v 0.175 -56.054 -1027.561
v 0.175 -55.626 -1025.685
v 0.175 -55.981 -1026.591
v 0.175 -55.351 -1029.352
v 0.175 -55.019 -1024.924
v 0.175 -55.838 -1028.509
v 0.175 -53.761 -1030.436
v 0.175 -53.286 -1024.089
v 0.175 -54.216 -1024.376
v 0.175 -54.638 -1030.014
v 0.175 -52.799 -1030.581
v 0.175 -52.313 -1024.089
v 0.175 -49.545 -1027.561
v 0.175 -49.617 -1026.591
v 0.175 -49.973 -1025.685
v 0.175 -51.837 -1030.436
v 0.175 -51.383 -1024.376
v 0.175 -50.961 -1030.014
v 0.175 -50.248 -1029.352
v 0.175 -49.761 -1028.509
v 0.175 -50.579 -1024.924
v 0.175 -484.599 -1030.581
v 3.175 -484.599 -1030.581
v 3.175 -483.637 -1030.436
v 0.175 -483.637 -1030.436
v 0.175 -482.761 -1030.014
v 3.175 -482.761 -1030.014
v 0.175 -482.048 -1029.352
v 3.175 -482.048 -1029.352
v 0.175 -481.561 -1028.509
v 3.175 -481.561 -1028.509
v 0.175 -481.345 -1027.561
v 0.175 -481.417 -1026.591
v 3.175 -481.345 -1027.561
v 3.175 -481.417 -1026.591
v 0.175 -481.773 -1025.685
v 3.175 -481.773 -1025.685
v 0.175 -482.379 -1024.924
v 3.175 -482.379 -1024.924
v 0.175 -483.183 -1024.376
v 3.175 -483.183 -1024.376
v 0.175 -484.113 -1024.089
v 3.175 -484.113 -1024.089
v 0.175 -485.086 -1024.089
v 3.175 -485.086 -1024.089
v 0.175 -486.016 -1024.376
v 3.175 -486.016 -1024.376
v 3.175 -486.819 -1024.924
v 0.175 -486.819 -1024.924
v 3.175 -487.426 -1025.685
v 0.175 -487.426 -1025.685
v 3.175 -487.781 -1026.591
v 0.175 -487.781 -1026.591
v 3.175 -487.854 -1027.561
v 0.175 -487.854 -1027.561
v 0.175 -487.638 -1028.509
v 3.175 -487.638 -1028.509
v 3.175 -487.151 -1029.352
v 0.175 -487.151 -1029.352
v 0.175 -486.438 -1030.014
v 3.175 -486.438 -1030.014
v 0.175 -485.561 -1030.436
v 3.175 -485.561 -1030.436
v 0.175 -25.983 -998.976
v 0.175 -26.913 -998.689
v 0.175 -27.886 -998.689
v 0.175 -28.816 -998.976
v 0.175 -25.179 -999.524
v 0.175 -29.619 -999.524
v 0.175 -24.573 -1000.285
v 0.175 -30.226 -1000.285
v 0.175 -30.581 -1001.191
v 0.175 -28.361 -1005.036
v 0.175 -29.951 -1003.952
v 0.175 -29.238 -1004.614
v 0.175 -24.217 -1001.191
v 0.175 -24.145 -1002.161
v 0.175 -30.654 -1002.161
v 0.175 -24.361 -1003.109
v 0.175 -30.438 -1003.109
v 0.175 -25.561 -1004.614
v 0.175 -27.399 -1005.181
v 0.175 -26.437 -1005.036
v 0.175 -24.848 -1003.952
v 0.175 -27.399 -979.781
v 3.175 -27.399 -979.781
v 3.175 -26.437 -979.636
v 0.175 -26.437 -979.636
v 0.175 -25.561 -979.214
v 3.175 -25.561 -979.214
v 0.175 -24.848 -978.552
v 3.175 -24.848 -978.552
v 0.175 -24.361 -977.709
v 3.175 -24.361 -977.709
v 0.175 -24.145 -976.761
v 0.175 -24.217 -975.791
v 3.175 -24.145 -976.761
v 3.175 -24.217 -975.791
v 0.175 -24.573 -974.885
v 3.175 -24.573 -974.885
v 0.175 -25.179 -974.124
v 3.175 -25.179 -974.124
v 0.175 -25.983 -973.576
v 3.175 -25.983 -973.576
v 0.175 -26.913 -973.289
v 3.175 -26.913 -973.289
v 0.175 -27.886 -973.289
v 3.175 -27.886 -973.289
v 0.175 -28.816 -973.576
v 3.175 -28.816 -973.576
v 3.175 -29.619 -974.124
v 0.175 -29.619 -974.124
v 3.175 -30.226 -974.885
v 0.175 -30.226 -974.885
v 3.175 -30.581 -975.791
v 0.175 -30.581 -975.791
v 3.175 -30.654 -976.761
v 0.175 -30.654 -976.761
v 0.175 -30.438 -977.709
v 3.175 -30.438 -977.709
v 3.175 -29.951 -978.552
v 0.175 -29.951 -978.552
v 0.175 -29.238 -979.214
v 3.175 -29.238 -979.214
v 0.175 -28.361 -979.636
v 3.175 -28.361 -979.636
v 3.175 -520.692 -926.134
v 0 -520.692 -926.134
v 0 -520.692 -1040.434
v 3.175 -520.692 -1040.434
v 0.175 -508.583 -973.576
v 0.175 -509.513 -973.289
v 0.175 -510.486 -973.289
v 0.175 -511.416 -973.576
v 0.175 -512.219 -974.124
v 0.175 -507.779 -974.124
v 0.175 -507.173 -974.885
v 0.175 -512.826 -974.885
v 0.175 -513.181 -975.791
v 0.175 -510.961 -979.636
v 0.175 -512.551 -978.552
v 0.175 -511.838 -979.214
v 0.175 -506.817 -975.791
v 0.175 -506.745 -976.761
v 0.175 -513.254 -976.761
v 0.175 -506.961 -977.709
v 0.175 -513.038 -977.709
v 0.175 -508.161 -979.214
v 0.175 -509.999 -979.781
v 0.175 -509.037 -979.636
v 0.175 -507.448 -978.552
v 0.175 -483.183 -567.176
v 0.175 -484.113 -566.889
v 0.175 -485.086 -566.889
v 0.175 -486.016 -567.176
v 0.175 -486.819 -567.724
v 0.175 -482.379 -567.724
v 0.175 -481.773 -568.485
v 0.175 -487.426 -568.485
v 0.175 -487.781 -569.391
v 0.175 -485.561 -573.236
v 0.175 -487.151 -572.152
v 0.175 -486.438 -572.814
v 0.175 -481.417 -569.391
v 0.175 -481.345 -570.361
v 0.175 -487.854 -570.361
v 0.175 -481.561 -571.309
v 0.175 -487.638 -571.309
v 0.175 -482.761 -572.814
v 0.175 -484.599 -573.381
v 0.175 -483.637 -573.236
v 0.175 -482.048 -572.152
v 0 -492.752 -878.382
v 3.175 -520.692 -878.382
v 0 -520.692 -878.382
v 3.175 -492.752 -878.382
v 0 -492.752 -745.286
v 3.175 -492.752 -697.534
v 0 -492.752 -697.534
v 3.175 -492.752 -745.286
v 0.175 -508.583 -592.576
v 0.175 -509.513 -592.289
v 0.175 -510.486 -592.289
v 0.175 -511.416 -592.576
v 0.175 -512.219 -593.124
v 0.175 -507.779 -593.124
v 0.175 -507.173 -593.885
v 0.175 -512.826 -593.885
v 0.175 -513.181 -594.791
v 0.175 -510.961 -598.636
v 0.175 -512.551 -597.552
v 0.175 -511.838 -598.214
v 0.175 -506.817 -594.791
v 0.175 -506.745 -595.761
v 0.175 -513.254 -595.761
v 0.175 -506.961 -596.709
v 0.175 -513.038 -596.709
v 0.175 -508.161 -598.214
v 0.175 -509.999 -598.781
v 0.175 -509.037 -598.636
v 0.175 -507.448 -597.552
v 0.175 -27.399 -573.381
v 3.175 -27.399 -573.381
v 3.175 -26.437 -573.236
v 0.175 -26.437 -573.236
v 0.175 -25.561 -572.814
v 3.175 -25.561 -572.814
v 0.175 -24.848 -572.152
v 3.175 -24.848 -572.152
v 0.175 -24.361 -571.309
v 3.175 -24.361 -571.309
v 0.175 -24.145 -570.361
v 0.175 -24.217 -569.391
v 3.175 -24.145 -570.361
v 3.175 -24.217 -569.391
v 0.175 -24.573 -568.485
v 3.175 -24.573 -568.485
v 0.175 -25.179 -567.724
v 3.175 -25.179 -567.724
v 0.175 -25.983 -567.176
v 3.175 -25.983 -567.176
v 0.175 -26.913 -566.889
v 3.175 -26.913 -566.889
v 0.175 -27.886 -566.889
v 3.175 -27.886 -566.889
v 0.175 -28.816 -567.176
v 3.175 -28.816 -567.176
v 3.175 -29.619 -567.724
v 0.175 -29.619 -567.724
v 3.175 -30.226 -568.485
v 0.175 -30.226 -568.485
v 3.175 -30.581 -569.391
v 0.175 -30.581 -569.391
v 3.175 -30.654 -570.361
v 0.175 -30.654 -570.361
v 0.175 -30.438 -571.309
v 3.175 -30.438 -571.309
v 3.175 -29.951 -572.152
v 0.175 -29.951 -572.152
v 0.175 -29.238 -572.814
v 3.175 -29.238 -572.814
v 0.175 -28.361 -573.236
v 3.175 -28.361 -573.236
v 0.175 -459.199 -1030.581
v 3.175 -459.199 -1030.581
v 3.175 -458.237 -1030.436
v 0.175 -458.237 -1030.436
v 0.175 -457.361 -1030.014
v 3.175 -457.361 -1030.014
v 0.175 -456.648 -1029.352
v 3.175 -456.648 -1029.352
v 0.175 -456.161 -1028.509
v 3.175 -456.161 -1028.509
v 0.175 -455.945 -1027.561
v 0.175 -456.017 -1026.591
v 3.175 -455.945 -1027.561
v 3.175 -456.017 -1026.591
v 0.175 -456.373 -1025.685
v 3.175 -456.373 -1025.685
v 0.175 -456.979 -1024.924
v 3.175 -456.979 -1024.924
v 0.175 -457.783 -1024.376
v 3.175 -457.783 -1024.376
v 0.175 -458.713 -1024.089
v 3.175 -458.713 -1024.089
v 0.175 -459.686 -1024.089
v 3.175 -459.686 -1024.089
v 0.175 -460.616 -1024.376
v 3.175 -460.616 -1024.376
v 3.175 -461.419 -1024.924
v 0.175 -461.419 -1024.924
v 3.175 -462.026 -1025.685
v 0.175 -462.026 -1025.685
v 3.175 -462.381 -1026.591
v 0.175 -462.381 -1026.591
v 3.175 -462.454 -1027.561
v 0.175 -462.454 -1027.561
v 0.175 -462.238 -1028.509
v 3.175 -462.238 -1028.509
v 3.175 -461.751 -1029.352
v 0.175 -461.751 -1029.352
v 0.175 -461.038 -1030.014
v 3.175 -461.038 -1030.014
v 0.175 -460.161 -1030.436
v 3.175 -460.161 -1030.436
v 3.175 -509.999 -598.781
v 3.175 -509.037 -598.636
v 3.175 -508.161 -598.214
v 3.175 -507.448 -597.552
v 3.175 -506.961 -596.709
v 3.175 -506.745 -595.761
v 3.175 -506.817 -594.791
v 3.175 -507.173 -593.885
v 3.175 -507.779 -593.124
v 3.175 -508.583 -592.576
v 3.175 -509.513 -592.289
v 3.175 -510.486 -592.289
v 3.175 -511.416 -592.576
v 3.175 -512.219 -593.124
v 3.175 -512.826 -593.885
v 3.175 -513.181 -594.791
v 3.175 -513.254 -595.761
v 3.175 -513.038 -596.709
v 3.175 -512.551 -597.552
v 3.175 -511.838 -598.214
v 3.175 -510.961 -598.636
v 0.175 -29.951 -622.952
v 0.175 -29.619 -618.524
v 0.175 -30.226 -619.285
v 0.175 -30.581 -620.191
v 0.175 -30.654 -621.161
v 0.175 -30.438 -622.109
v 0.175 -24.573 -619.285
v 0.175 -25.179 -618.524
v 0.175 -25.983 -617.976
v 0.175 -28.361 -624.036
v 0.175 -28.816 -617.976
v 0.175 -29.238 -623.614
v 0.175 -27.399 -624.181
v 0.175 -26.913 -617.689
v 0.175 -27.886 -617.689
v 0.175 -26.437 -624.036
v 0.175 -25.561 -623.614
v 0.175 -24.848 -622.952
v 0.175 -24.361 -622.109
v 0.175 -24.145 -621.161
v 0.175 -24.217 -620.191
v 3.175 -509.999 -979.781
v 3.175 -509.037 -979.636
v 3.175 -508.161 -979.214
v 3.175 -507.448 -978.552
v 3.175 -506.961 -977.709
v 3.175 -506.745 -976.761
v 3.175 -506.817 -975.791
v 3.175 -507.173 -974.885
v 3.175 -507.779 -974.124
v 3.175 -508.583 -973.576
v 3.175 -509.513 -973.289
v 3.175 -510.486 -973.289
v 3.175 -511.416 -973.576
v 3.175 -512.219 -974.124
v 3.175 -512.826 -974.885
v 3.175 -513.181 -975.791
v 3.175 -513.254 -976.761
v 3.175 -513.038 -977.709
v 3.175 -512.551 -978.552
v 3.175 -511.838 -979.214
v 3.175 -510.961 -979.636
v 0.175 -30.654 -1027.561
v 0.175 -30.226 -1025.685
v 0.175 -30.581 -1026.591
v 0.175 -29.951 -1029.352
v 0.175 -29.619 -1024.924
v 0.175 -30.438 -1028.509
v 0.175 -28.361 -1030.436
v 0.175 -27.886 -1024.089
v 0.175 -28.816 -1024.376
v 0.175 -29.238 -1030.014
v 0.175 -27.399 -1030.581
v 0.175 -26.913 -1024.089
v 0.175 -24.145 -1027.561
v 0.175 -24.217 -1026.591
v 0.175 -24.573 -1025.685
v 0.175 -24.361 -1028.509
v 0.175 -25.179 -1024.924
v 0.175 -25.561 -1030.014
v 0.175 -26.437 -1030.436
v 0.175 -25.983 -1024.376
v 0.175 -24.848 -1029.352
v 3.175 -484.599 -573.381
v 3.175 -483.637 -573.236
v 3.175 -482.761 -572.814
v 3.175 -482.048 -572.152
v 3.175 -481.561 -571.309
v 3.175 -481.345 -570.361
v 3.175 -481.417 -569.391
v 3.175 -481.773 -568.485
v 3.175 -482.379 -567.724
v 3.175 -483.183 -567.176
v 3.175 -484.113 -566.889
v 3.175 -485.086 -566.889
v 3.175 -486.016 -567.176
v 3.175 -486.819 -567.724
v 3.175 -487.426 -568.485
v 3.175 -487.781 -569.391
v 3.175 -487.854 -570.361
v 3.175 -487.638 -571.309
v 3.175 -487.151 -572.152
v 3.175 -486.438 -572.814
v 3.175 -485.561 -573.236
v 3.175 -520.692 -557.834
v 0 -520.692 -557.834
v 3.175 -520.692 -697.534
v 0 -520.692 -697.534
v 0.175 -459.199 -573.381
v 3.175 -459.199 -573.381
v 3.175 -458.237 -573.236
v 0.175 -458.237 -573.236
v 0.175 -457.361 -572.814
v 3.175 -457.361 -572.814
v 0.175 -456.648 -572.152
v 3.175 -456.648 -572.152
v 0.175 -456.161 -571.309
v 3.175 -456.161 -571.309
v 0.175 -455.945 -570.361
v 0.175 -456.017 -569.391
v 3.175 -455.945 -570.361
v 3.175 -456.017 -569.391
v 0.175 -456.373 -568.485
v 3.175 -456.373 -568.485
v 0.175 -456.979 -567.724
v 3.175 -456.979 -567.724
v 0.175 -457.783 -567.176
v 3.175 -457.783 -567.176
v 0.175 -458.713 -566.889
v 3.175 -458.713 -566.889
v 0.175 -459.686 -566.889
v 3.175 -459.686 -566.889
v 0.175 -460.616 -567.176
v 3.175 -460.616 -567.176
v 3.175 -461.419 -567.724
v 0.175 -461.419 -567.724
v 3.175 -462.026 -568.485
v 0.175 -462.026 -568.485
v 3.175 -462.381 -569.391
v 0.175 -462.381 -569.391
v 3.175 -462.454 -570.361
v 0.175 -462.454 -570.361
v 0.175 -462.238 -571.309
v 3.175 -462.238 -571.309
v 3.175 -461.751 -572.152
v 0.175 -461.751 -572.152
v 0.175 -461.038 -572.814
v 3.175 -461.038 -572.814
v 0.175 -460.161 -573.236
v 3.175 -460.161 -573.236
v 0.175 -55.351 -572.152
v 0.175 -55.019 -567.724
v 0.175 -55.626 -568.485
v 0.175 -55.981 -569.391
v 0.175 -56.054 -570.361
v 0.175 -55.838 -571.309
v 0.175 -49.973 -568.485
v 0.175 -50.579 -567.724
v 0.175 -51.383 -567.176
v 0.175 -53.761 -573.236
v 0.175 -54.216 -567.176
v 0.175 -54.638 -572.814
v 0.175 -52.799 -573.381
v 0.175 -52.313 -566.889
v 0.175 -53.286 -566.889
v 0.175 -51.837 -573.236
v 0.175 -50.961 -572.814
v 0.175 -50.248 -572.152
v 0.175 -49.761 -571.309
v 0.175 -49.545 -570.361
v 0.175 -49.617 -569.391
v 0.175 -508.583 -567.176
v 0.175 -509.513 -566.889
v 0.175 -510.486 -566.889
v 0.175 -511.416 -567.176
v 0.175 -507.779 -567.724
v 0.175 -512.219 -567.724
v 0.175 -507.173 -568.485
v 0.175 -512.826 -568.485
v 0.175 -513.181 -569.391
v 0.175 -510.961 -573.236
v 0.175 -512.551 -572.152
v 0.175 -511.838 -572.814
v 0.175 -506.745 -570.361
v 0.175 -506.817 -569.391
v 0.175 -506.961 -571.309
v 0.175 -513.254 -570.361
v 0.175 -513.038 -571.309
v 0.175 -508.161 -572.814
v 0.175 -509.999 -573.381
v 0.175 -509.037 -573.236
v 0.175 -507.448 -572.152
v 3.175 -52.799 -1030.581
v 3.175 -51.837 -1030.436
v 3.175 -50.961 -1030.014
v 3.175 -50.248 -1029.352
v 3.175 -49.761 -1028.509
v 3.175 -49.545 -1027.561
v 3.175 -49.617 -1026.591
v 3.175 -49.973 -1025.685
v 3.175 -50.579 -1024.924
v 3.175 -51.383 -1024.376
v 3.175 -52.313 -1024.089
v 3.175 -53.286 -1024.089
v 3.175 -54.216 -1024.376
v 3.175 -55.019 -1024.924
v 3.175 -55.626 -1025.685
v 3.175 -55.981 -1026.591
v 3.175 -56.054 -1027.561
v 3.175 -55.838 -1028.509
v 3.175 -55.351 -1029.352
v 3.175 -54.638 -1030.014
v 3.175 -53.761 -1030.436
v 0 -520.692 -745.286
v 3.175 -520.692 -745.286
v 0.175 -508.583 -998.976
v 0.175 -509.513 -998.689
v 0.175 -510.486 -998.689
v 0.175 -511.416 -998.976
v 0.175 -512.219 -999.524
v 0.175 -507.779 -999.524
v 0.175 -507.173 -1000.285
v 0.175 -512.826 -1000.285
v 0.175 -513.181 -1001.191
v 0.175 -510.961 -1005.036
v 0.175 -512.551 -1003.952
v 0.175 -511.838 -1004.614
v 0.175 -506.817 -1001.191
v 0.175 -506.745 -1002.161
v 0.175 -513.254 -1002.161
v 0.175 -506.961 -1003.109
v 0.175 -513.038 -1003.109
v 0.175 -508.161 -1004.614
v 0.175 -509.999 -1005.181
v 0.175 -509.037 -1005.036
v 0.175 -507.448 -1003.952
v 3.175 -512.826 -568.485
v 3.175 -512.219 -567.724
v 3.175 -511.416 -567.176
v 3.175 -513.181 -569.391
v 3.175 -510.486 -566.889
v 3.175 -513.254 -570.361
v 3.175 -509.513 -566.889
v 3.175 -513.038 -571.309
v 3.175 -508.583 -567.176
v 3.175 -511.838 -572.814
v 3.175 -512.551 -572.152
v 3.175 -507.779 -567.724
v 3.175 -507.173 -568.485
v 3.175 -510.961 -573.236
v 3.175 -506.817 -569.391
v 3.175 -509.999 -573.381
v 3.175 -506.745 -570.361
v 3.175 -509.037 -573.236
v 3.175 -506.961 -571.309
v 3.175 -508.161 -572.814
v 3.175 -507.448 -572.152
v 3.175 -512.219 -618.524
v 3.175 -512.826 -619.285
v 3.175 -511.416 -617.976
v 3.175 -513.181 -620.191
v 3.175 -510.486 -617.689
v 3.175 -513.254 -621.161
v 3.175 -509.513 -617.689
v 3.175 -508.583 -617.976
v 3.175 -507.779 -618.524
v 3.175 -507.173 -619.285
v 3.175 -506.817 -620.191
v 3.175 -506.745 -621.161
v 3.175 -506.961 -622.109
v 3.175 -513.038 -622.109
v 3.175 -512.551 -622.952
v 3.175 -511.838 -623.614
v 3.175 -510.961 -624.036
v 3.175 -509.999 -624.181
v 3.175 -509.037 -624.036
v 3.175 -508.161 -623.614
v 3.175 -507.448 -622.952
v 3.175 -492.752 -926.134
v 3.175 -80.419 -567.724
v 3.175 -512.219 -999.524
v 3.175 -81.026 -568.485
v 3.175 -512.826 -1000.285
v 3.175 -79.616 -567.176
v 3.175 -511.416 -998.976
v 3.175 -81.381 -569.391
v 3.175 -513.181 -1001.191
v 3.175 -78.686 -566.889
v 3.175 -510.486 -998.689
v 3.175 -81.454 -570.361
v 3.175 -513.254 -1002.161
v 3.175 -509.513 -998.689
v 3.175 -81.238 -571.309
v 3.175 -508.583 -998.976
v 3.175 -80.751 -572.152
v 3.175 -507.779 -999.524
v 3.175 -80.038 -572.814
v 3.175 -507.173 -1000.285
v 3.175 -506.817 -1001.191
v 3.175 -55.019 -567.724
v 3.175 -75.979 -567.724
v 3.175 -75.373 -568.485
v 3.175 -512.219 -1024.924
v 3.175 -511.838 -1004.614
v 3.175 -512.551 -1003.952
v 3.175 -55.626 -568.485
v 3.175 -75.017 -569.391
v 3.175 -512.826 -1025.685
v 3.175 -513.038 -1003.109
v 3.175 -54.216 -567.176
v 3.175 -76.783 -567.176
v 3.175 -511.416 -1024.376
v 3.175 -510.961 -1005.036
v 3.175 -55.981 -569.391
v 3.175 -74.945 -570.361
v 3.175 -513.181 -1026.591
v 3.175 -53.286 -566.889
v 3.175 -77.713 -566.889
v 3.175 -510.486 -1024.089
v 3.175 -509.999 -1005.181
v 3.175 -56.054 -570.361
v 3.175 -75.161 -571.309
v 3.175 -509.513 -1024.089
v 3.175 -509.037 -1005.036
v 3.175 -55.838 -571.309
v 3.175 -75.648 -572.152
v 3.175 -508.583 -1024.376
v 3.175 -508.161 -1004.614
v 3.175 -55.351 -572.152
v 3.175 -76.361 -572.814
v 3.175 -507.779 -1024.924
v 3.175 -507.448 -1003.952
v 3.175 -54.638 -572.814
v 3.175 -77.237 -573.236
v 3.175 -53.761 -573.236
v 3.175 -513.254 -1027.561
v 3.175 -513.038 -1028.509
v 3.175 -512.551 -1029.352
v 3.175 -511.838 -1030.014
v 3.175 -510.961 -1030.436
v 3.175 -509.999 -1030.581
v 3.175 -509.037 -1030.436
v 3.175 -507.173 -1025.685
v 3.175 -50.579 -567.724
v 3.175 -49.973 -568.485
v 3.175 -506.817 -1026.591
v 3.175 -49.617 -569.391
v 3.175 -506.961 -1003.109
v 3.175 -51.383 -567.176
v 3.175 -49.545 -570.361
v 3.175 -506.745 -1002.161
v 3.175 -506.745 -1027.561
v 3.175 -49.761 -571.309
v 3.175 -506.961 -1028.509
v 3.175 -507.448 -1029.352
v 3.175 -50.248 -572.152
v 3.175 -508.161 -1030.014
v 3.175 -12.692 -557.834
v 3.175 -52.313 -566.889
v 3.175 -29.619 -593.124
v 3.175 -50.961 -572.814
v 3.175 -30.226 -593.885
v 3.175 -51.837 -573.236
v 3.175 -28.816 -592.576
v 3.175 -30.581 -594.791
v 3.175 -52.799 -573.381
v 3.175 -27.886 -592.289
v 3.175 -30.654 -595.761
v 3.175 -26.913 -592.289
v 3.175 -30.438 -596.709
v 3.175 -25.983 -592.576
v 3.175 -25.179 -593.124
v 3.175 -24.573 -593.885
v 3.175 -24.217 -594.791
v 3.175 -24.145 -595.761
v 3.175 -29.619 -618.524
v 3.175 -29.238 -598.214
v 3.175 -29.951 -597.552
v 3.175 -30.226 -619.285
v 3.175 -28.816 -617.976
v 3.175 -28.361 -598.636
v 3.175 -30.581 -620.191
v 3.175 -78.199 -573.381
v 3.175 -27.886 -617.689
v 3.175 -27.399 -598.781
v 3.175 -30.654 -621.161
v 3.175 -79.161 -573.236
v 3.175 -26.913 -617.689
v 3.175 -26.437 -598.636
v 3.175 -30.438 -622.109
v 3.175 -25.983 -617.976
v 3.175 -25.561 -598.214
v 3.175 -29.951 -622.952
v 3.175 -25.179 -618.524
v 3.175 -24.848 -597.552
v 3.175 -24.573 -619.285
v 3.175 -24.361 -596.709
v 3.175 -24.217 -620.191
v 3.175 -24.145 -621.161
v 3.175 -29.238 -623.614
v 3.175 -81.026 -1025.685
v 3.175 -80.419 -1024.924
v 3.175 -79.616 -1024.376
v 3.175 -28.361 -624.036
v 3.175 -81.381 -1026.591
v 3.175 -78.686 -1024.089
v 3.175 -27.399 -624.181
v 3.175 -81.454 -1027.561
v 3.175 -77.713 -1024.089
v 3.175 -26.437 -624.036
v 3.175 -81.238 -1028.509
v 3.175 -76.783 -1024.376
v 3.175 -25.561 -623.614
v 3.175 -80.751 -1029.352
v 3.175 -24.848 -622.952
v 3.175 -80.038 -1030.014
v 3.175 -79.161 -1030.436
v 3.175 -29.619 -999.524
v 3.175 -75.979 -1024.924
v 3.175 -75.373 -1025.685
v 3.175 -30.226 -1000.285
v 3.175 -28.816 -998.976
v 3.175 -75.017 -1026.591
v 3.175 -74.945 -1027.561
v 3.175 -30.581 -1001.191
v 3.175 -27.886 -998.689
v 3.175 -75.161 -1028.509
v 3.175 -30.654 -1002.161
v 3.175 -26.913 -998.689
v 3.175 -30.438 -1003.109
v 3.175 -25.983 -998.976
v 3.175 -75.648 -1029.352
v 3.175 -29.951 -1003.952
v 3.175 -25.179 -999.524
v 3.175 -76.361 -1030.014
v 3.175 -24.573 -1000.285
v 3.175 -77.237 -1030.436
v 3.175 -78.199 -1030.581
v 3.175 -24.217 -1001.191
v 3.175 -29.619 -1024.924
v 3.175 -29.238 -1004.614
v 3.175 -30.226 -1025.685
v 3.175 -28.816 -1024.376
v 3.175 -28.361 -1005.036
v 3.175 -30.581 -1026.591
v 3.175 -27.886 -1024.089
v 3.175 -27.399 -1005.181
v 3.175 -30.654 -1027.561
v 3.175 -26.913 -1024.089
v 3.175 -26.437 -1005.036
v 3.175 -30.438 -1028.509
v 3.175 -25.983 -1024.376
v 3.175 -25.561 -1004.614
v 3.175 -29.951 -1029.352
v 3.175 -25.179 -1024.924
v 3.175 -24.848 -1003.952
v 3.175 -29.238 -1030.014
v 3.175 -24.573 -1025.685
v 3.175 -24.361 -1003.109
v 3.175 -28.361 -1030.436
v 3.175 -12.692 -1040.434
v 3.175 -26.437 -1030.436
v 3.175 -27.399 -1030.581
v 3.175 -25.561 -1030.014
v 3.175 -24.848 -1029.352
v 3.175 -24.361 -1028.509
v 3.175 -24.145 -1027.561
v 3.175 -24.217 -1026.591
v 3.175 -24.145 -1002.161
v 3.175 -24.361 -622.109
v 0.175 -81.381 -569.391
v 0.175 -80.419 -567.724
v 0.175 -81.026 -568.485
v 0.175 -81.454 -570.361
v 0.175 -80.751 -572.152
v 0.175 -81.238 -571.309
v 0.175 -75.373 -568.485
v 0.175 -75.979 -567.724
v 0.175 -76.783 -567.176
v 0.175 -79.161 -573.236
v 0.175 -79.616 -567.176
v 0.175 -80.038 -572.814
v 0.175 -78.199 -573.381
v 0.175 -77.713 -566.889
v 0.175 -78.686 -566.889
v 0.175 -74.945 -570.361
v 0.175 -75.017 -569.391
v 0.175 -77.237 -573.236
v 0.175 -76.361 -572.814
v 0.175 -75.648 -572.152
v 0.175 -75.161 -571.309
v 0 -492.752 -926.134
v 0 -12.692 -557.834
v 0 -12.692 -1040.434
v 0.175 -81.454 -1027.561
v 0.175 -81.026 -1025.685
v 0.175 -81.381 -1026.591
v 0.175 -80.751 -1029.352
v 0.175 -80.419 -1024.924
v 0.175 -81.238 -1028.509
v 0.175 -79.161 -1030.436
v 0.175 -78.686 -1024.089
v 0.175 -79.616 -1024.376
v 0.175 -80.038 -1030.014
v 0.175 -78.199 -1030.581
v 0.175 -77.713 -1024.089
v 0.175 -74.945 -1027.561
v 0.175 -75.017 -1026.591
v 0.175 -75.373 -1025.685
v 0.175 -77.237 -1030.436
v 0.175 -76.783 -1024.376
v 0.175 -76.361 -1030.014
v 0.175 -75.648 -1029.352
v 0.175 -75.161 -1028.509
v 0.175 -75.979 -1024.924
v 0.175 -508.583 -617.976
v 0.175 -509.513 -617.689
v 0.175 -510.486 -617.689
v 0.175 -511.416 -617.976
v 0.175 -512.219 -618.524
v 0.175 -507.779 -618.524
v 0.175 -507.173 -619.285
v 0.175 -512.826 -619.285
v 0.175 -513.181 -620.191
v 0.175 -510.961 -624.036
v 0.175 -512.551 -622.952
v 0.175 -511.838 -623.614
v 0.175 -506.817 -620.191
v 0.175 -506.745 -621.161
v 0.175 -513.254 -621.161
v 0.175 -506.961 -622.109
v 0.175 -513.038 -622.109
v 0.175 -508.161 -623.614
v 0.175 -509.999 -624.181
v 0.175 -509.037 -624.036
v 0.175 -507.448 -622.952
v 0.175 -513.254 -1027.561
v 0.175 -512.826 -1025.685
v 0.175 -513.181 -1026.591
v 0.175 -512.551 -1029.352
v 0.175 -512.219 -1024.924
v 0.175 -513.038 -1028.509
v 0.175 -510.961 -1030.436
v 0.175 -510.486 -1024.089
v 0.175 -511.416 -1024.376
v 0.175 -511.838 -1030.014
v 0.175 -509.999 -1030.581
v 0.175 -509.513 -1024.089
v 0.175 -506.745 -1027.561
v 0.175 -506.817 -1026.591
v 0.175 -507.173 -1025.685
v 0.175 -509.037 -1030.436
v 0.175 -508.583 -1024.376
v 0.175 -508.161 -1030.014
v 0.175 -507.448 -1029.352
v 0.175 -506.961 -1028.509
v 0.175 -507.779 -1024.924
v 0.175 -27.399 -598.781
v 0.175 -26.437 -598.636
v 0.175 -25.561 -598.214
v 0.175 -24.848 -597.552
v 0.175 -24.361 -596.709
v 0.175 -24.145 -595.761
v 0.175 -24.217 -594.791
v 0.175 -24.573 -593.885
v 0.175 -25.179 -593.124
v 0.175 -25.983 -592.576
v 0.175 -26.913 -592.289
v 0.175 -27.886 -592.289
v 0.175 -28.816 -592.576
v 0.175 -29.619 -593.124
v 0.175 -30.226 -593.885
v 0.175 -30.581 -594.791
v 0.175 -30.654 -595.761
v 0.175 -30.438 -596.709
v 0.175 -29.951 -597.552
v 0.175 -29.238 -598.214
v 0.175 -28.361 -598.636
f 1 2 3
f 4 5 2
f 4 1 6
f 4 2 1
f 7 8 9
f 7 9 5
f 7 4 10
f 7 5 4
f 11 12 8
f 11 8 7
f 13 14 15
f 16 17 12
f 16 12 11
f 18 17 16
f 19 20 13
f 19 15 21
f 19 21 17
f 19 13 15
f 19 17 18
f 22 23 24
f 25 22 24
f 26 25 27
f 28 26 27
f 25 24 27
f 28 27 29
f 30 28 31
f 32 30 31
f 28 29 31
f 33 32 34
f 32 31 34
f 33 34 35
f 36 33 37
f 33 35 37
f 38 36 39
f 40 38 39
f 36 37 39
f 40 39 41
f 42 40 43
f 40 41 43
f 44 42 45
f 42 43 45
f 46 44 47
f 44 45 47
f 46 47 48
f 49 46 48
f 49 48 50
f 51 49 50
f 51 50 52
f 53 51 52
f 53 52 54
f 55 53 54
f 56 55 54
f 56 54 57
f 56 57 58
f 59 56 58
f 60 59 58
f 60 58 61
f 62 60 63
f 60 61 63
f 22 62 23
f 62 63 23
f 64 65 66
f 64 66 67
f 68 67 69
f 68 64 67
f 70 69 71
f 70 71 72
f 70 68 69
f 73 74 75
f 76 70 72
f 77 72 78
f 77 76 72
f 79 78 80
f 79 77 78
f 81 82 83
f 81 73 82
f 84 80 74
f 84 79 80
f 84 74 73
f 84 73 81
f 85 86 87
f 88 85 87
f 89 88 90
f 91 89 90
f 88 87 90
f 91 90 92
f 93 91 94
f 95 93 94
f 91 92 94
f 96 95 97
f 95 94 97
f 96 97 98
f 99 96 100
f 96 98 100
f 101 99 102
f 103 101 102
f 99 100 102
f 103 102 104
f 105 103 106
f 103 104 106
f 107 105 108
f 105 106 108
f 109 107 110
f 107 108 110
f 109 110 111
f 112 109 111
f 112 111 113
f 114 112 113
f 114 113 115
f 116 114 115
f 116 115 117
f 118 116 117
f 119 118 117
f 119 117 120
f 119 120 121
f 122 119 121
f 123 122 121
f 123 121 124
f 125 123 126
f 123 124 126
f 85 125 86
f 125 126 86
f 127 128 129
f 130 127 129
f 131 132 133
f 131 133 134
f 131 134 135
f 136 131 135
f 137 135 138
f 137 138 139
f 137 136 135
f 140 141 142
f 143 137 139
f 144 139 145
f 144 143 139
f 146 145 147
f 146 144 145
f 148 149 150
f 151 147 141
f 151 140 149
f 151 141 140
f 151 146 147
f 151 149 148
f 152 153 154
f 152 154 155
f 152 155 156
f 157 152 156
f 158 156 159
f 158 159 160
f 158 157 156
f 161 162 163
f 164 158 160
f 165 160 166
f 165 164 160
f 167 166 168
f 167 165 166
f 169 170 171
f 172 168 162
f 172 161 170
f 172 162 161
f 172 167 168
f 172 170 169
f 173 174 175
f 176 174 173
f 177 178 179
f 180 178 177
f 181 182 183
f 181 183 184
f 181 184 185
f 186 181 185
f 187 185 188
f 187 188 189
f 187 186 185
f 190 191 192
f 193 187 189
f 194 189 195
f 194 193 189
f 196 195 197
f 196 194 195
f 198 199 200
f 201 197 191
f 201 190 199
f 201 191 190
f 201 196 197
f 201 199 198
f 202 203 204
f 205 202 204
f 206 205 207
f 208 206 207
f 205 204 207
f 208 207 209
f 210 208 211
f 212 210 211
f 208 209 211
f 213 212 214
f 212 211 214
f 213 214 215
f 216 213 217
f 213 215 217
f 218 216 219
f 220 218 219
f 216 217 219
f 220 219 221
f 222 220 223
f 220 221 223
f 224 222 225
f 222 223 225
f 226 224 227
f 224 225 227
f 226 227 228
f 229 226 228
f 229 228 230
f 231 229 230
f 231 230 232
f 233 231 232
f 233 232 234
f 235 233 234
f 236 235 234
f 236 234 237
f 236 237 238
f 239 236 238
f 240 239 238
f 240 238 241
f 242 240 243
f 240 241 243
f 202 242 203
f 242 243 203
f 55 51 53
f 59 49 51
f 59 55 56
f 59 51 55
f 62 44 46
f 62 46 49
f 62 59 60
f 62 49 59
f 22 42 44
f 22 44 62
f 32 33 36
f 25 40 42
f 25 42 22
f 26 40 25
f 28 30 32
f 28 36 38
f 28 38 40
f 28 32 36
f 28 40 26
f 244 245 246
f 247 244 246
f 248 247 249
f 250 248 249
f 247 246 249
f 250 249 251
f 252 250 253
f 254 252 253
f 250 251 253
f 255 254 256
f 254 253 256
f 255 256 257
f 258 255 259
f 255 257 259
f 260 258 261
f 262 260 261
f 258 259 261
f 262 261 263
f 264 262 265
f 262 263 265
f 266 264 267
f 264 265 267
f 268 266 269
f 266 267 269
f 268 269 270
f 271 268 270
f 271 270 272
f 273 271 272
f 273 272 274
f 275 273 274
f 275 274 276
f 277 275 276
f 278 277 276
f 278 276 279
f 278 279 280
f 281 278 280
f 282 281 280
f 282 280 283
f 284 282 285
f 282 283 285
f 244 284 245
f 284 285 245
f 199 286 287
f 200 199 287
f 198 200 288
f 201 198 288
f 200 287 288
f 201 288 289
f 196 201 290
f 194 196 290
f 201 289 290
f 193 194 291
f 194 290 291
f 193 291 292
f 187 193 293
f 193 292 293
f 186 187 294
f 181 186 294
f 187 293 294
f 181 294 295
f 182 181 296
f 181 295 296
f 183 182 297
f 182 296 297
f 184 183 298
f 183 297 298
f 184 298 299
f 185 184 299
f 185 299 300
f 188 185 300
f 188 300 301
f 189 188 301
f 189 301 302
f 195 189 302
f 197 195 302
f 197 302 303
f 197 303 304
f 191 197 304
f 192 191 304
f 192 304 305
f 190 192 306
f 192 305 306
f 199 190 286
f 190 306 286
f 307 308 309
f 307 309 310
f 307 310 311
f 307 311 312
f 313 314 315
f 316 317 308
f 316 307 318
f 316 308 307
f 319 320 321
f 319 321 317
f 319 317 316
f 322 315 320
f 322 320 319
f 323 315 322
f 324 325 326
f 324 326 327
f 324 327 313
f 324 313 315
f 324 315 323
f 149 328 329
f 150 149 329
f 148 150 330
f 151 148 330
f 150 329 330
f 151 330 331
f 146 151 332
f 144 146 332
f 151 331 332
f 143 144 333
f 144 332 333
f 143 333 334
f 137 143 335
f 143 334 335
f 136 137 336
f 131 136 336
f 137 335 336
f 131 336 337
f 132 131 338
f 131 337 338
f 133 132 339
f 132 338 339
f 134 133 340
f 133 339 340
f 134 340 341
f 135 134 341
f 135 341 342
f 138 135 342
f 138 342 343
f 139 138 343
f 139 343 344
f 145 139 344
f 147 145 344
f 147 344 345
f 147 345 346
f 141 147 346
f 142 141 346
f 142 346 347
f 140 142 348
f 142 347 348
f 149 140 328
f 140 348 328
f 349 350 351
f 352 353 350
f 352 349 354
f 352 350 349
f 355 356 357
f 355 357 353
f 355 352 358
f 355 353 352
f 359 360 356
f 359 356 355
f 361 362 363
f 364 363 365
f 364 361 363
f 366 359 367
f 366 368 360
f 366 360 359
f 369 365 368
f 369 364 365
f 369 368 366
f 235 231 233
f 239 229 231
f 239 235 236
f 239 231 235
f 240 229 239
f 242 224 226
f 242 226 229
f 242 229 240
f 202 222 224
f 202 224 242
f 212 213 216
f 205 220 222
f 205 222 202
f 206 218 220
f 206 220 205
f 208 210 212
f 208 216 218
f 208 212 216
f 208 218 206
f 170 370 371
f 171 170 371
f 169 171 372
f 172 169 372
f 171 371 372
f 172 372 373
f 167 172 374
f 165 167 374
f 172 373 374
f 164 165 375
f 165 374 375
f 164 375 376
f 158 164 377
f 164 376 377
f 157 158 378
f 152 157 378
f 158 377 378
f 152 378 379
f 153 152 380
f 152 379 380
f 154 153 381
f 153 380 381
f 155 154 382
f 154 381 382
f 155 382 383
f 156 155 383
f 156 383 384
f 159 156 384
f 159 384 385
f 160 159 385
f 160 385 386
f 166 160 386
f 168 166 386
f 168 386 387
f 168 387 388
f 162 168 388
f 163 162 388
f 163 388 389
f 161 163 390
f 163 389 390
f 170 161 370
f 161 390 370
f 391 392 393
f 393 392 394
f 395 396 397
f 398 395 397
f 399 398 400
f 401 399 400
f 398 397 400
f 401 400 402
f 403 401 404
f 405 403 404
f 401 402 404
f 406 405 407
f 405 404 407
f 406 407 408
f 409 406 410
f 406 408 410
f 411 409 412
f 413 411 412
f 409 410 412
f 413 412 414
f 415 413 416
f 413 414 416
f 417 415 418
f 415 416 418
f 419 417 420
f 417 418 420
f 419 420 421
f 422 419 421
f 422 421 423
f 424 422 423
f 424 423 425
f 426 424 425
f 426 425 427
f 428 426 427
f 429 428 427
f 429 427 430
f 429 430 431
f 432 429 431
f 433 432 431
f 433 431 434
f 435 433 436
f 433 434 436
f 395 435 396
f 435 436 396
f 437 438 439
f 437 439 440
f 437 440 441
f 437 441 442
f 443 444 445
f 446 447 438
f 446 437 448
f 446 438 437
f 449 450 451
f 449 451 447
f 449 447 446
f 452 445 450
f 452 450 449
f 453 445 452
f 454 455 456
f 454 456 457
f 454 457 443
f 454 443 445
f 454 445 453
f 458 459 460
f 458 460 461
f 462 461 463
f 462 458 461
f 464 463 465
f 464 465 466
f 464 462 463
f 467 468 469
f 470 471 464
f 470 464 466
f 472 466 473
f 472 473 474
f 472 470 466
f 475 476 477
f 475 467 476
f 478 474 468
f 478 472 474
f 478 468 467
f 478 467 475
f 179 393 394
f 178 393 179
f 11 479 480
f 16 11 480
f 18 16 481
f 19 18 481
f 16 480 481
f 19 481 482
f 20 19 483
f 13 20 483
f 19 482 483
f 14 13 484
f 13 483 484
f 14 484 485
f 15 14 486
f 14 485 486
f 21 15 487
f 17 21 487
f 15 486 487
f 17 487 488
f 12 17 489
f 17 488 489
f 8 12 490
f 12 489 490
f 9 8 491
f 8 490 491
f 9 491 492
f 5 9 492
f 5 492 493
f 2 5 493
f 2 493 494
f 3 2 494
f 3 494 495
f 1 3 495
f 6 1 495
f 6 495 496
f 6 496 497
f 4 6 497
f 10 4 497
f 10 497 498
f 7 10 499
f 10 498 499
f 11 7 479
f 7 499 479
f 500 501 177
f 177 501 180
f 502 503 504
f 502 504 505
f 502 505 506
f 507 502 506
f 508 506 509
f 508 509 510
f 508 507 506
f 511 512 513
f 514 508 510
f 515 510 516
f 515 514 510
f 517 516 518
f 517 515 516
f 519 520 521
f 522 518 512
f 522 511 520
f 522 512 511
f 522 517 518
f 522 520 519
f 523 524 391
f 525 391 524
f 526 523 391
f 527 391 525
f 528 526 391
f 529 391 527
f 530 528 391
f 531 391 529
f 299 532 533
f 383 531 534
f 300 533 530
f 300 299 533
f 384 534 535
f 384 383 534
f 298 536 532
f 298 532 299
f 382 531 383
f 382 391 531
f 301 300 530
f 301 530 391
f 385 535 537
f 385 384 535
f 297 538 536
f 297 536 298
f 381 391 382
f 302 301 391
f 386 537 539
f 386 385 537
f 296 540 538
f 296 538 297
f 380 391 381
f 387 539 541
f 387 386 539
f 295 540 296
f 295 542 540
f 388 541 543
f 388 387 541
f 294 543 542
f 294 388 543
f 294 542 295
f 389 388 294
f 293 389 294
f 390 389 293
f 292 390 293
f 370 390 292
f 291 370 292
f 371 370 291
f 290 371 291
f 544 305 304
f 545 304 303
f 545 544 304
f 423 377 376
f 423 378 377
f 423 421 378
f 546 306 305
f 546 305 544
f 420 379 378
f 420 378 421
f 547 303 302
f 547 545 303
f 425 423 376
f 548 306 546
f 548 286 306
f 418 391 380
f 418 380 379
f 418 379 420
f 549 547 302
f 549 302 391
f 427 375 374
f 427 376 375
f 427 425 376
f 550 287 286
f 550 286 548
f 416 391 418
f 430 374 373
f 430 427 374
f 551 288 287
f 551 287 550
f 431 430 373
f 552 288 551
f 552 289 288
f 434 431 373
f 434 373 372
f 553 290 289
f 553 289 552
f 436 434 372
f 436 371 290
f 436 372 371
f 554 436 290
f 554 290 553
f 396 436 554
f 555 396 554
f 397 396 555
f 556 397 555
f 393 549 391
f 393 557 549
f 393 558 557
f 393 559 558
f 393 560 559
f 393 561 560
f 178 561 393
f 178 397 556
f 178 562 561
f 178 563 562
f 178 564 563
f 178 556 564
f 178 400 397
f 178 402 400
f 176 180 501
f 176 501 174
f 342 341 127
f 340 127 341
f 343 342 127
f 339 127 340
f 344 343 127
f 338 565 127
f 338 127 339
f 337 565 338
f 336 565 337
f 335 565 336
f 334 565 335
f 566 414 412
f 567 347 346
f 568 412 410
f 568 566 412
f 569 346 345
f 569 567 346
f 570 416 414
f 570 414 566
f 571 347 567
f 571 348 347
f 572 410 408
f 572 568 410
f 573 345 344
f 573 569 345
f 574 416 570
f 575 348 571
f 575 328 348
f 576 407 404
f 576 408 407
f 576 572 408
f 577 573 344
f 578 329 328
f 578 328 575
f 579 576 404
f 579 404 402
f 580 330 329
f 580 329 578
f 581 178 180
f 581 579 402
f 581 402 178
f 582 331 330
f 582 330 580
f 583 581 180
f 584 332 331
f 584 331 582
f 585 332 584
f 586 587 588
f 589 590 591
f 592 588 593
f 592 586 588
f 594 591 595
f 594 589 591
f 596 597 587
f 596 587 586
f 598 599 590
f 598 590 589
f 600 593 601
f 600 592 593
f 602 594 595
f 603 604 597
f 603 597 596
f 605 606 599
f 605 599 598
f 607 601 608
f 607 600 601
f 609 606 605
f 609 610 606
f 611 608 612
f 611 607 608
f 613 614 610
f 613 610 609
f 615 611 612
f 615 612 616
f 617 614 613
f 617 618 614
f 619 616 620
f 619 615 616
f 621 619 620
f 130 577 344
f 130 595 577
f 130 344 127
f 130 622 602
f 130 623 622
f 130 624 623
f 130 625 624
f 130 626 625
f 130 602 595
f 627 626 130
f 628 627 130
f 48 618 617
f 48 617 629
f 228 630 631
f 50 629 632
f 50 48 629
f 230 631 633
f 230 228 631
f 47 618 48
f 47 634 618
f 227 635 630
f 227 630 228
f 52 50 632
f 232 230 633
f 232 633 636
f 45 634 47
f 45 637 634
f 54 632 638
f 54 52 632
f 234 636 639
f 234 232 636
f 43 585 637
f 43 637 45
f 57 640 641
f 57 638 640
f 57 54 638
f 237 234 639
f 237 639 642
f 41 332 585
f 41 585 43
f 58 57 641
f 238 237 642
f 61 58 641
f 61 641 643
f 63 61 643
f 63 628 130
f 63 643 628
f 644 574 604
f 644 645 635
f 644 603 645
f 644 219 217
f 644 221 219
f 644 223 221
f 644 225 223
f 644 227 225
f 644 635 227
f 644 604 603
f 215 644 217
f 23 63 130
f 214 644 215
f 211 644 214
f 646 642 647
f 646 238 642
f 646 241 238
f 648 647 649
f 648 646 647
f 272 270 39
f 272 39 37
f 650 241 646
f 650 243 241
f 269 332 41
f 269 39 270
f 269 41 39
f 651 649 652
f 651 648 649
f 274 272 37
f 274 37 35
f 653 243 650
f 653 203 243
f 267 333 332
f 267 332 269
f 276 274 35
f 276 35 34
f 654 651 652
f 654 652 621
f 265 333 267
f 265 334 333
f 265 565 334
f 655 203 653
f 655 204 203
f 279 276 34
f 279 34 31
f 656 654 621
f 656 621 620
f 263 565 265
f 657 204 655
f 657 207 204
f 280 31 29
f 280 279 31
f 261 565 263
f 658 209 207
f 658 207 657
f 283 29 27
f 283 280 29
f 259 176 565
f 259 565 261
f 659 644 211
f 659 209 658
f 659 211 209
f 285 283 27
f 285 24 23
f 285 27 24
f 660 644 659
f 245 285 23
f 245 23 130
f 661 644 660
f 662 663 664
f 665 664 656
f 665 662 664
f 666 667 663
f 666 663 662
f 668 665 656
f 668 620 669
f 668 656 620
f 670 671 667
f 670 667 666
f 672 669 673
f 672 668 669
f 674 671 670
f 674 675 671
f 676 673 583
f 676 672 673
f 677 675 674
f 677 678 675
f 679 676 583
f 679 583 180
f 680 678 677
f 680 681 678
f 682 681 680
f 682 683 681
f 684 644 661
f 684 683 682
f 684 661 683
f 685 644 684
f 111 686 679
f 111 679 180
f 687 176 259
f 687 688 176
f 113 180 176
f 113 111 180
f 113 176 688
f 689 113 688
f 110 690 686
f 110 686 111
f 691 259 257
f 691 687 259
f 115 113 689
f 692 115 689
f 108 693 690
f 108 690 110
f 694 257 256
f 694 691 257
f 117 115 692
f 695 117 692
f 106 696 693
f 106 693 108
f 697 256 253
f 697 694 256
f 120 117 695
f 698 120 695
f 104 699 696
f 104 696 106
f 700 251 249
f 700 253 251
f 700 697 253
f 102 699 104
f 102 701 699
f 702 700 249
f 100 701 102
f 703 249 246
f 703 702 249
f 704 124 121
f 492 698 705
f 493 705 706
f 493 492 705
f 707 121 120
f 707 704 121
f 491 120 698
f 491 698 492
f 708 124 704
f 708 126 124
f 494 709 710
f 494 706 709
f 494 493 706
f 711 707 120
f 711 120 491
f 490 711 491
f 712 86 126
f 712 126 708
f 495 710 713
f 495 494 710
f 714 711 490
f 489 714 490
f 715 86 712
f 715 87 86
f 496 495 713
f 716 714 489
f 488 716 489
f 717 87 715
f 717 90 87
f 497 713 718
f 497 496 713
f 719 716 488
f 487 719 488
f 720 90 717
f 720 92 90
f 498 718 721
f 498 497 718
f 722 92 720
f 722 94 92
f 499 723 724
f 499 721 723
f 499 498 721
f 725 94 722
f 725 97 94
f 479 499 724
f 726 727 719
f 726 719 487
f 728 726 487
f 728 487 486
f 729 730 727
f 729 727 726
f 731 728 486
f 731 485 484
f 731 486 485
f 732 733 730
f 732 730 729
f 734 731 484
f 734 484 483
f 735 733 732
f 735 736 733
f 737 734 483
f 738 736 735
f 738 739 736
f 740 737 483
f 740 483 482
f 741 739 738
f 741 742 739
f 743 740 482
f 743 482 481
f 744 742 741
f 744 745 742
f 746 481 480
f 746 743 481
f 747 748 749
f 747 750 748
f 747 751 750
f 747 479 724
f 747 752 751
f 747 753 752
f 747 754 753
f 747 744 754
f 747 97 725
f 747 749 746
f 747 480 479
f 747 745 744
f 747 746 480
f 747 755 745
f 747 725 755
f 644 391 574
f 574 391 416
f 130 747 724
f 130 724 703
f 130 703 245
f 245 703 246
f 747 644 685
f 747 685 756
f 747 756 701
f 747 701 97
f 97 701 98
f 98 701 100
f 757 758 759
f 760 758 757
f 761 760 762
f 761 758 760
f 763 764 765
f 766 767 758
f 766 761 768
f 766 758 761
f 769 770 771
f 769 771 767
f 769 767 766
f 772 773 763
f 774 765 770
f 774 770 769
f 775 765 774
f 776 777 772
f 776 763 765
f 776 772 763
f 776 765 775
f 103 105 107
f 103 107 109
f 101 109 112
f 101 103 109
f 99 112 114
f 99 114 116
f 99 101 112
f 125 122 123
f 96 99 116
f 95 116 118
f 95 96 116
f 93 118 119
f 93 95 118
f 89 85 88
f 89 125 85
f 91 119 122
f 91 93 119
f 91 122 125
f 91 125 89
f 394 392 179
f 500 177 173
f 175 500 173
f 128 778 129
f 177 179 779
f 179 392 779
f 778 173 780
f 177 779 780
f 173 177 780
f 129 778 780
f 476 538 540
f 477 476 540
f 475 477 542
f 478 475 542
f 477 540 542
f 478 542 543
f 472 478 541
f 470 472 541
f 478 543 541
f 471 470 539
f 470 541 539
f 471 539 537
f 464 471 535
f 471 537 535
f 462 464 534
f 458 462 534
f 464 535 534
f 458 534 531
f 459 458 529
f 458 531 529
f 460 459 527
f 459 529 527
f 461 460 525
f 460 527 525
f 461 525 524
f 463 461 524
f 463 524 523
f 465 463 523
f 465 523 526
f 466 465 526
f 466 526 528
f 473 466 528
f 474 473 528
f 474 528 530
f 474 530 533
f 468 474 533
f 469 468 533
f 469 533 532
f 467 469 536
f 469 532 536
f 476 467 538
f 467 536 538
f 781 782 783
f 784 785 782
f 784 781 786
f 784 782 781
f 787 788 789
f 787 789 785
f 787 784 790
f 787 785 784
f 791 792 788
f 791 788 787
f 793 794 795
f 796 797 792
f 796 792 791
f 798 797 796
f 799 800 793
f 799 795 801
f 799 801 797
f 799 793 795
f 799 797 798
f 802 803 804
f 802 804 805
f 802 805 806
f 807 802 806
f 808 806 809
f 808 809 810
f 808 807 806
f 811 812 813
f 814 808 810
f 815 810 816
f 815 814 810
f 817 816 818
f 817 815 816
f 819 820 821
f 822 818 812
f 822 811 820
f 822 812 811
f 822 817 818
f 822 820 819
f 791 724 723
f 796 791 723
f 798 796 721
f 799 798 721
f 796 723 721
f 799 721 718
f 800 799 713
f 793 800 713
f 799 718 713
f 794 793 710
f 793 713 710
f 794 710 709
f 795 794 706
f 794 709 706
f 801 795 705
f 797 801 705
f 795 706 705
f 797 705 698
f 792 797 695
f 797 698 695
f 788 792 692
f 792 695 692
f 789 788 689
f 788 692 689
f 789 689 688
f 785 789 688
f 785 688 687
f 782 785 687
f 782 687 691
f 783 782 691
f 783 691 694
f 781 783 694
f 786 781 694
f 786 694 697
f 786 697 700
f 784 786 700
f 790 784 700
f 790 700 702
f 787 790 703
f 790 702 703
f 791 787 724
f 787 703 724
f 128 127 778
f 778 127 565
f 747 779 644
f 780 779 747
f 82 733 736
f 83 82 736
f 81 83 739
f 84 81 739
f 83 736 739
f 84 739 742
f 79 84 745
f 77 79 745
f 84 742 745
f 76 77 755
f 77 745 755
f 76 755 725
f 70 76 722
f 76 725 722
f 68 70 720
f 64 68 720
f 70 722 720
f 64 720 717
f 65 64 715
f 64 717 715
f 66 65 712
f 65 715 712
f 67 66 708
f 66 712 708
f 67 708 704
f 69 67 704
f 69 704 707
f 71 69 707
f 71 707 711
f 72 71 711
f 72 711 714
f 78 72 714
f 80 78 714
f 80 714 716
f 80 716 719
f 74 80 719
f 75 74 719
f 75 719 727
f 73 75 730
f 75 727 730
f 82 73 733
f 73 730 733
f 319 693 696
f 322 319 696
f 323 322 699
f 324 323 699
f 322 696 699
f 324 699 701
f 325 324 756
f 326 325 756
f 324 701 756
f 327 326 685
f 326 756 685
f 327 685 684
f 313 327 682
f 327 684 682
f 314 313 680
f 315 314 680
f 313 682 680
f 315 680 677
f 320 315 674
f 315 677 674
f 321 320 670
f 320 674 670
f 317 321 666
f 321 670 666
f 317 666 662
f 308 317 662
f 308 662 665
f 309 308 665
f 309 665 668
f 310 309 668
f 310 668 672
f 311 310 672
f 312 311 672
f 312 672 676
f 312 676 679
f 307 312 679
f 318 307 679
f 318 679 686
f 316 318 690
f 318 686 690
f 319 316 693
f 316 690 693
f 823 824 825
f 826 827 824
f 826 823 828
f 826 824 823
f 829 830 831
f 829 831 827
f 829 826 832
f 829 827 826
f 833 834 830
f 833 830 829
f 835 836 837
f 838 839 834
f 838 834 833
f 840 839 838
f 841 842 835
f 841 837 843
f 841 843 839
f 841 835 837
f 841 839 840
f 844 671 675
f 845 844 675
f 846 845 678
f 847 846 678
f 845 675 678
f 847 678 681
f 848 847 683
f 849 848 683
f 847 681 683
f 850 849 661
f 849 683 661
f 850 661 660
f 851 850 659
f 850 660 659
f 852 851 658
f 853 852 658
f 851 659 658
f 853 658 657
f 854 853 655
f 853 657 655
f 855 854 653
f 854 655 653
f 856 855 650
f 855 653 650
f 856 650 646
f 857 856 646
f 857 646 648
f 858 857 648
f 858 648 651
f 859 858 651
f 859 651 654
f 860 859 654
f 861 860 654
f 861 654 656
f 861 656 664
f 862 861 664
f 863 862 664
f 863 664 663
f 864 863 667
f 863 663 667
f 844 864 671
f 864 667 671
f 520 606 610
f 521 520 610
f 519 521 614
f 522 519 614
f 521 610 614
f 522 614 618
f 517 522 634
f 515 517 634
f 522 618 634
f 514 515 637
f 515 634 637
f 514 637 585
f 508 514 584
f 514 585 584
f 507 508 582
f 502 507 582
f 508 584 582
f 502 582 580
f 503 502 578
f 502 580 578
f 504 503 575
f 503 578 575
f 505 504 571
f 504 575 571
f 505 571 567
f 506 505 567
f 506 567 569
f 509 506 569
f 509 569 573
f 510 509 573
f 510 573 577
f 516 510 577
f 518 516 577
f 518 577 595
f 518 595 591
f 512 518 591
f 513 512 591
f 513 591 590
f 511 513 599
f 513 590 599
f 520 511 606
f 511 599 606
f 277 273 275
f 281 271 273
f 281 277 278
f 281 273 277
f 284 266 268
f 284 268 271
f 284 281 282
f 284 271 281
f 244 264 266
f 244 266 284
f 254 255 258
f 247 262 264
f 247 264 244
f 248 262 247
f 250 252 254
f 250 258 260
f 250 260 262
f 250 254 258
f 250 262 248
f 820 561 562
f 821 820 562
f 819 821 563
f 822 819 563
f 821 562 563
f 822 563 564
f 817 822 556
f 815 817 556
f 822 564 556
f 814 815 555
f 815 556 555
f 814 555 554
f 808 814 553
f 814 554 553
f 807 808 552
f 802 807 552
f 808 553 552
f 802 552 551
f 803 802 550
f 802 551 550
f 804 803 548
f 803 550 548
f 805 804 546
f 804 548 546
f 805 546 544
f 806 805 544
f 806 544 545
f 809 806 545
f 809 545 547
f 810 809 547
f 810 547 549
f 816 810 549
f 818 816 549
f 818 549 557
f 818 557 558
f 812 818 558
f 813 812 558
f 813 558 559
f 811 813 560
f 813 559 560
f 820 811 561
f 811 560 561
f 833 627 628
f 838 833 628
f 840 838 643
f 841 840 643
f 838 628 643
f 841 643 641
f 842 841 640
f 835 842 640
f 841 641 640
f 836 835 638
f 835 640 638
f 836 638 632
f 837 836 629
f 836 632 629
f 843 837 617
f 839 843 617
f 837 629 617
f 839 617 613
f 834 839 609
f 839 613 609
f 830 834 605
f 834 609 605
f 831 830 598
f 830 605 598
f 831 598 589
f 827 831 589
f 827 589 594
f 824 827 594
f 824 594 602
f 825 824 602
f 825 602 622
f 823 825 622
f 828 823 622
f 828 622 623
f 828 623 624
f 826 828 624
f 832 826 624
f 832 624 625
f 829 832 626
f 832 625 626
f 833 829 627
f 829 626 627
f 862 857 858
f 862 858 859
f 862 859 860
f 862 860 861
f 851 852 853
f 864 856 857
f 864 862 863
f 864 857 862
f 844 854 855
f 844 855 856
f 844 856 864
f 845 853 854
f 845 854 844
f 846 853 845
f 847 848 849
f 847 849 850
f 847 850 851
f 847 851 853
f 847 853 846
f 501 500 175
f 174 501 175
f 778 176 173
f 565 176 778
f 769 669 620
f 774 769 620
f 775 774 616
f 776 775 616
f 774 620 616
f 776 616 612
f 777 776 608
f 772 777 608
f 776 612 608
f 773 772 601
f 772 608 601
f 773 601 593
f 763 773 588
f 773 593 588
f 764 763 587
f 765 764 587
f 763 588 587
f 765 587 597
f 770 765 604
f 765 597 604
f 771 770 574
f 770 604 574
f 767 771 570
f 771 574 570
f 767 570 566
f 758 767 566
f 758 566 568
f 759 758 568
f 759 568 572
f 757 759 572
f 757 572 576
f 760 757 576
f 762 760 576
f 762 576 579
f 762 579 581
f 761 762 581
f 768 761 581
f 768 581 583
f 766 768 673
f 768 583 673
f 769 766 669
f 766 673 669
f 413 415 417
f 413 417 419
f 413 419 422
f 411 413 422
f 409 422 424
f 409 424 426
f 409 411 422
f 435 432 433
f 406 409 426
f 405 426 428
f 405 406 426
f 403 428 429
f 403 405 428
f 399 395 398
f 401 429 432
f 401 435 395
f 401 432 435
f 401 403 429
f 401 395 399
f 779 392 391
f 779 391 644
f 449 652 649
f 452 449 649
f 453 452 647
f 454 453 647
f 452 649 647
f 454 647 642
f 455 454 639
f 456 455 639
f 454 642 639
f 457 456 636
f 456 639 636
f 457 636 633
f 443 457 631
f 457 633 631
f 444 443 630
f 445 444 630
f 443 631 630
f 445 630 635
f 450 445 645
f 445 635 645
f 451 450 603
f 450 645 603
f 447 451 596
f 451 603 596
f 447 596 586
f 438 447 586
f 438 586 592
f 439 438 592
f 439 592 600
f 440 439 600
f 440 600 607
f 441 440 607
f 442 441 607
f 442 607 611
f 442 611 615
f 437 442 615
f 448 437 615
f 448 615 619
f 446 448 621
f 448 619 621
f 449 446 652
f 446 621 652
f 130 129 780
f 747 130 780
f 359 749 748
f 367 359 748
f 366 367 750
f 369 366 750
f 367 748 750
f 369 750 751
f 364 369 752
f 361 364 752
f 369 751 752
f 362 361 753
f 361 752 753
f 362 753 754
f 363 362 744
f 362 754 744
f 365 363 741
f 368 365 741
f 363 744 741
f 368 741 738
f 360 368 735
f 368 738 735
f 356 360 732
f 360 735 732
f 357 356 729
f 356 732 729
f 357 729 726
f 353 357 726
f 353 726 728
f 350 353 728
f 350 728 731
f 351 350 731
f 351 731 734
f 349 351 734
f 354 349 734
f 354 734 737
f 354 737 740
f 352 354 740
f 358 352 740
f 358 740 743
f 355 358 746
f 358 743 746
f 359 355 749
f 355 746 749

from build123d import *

# Parameters (mm, degrees)
SKETCH1_W           = 482.6
SKETCH1_H           = 508
BOSS_EXTRUDE1_DEPTH = 3.175
SKETCH2_W           = 47.752
SKETCH2_H           = 27.94
CUT_EXTRUDE1_DEPTH  = 1164.457101784
SKETCH3_R           = 3.263899997
SKETCH3_R_2         = 3.263900001
SKETCH3_R_3         = 3.263899999
SKETCH3_R_4         = 3.2639
CUT_EXTRUDE2_DEPTH  = 3


with BuildPart() as part:
    # Sketch1 → Boss-Extrude1 (new body)
    with BuildSketch(Plane(origin=(0, 0, 0), x_dir=(0, 0, -1), z_dir=(1, 0, 0))):
        with Locations((799.13388237, -266.691543511)):
            Rectangle(SKETCH1_W, SKETCH1_H)
    extrude(amount=BOSS_EXTRUDE1_DEPTH)

    # Sketch2 → Cut-Extrude1 (cut, through all)
    with BuildSketch(Plane(origin=(3.175, 0, 0), x_dir=(0, 0, -1), z_dir=(1, 0, 0))):
        with Locations((721.40988237, -506.721543511)):
            Rectangle(SKETCH2_W, SKETCH2_H)
        with Locations((902.25788237, -506.721543511)):
            Rectangle(SKETCH2_W, SKETCH2_H)
    extrude(amount=-CUT_EXTRUDE1_DEPTH, mode=Mode.SUBTRACT)

    # Sketch3 → Cut-Extrude2 (cut)
    with BuildSketch(Plane(origin=(3.175, 0, 0), x_dir=(0, 0, -1), z_dir=(1, 0, 0))):
        with Locations((570.11679197, -27.399401396)):
            Circle(SKETCH3_R)
        with Locations((595.516791968, -27.399401397)):
            Circle(SKETCH3_R_2)
        with Locations((620.916791968, -27.399401397)):
            Circle(SKETCH3_R_2)
        with Locations((570.116791968, -52.799401397)):
            Circle(SKETCH3_R_2)
        with Locations((570.116791967, -78.199401397)):
            Circle(SKETCH3_R_2)
        with Locations((570.116791968, -509.999401397)):
            Circle(SKETCH3_R_3)
        with Locations((570.116791967, -484.599401397)):
            Circle(SKETCH3_R_4)
        with Locations((570.116791967, -459.199401397)):
            Circle(SKETCH3_R_4)
        with Locations((595.516791967, -509.999401397)):
            Circle(SKETCH3_R_4)
        with Locations((620.916791967, -509.999401397)):
            Circle(SKETCH3_R_4)
        with Locations((1027.316791967, -509.999401397)):
            Circle(SKETCH3_R_4)
        with Locations((1001.916791967, -509.999401397)):
            Circle(SKETCH3_R_4)
        with Locations((976.516791967, -509.999401397)):
            Circle(SKETCH3_R_4)
        with Locations((1027.316791967, -459.199401397)):
            Circle(SKETCH3_R_4)
        with Locations((1027.316791967, -484.599401397)):
            Circle(SKETCH3_R_4)
        with Locations((1027.316791967, -27.399401397)):
            Circle(SKETCH3_R_4)
        with Locations((1001.916791967, -27.399401397)):
            Circle(SKETCH3_R_4)
        with Locations((976.516791967, -27.399401397)):
            Circle(SKETCH3_R_4)
        with Locations((1027.316791967, -52.799401397)):
            Circle(SKETCH3_R_4)
        with Locations((1027.316791967, -78.199401397)):
            Circle(SKETCH3_R_4)
    extrude(amount=-CUT_EXTRUDE2_DEPTH, mode=Mode.SUBTRACT)


solid = part.part
